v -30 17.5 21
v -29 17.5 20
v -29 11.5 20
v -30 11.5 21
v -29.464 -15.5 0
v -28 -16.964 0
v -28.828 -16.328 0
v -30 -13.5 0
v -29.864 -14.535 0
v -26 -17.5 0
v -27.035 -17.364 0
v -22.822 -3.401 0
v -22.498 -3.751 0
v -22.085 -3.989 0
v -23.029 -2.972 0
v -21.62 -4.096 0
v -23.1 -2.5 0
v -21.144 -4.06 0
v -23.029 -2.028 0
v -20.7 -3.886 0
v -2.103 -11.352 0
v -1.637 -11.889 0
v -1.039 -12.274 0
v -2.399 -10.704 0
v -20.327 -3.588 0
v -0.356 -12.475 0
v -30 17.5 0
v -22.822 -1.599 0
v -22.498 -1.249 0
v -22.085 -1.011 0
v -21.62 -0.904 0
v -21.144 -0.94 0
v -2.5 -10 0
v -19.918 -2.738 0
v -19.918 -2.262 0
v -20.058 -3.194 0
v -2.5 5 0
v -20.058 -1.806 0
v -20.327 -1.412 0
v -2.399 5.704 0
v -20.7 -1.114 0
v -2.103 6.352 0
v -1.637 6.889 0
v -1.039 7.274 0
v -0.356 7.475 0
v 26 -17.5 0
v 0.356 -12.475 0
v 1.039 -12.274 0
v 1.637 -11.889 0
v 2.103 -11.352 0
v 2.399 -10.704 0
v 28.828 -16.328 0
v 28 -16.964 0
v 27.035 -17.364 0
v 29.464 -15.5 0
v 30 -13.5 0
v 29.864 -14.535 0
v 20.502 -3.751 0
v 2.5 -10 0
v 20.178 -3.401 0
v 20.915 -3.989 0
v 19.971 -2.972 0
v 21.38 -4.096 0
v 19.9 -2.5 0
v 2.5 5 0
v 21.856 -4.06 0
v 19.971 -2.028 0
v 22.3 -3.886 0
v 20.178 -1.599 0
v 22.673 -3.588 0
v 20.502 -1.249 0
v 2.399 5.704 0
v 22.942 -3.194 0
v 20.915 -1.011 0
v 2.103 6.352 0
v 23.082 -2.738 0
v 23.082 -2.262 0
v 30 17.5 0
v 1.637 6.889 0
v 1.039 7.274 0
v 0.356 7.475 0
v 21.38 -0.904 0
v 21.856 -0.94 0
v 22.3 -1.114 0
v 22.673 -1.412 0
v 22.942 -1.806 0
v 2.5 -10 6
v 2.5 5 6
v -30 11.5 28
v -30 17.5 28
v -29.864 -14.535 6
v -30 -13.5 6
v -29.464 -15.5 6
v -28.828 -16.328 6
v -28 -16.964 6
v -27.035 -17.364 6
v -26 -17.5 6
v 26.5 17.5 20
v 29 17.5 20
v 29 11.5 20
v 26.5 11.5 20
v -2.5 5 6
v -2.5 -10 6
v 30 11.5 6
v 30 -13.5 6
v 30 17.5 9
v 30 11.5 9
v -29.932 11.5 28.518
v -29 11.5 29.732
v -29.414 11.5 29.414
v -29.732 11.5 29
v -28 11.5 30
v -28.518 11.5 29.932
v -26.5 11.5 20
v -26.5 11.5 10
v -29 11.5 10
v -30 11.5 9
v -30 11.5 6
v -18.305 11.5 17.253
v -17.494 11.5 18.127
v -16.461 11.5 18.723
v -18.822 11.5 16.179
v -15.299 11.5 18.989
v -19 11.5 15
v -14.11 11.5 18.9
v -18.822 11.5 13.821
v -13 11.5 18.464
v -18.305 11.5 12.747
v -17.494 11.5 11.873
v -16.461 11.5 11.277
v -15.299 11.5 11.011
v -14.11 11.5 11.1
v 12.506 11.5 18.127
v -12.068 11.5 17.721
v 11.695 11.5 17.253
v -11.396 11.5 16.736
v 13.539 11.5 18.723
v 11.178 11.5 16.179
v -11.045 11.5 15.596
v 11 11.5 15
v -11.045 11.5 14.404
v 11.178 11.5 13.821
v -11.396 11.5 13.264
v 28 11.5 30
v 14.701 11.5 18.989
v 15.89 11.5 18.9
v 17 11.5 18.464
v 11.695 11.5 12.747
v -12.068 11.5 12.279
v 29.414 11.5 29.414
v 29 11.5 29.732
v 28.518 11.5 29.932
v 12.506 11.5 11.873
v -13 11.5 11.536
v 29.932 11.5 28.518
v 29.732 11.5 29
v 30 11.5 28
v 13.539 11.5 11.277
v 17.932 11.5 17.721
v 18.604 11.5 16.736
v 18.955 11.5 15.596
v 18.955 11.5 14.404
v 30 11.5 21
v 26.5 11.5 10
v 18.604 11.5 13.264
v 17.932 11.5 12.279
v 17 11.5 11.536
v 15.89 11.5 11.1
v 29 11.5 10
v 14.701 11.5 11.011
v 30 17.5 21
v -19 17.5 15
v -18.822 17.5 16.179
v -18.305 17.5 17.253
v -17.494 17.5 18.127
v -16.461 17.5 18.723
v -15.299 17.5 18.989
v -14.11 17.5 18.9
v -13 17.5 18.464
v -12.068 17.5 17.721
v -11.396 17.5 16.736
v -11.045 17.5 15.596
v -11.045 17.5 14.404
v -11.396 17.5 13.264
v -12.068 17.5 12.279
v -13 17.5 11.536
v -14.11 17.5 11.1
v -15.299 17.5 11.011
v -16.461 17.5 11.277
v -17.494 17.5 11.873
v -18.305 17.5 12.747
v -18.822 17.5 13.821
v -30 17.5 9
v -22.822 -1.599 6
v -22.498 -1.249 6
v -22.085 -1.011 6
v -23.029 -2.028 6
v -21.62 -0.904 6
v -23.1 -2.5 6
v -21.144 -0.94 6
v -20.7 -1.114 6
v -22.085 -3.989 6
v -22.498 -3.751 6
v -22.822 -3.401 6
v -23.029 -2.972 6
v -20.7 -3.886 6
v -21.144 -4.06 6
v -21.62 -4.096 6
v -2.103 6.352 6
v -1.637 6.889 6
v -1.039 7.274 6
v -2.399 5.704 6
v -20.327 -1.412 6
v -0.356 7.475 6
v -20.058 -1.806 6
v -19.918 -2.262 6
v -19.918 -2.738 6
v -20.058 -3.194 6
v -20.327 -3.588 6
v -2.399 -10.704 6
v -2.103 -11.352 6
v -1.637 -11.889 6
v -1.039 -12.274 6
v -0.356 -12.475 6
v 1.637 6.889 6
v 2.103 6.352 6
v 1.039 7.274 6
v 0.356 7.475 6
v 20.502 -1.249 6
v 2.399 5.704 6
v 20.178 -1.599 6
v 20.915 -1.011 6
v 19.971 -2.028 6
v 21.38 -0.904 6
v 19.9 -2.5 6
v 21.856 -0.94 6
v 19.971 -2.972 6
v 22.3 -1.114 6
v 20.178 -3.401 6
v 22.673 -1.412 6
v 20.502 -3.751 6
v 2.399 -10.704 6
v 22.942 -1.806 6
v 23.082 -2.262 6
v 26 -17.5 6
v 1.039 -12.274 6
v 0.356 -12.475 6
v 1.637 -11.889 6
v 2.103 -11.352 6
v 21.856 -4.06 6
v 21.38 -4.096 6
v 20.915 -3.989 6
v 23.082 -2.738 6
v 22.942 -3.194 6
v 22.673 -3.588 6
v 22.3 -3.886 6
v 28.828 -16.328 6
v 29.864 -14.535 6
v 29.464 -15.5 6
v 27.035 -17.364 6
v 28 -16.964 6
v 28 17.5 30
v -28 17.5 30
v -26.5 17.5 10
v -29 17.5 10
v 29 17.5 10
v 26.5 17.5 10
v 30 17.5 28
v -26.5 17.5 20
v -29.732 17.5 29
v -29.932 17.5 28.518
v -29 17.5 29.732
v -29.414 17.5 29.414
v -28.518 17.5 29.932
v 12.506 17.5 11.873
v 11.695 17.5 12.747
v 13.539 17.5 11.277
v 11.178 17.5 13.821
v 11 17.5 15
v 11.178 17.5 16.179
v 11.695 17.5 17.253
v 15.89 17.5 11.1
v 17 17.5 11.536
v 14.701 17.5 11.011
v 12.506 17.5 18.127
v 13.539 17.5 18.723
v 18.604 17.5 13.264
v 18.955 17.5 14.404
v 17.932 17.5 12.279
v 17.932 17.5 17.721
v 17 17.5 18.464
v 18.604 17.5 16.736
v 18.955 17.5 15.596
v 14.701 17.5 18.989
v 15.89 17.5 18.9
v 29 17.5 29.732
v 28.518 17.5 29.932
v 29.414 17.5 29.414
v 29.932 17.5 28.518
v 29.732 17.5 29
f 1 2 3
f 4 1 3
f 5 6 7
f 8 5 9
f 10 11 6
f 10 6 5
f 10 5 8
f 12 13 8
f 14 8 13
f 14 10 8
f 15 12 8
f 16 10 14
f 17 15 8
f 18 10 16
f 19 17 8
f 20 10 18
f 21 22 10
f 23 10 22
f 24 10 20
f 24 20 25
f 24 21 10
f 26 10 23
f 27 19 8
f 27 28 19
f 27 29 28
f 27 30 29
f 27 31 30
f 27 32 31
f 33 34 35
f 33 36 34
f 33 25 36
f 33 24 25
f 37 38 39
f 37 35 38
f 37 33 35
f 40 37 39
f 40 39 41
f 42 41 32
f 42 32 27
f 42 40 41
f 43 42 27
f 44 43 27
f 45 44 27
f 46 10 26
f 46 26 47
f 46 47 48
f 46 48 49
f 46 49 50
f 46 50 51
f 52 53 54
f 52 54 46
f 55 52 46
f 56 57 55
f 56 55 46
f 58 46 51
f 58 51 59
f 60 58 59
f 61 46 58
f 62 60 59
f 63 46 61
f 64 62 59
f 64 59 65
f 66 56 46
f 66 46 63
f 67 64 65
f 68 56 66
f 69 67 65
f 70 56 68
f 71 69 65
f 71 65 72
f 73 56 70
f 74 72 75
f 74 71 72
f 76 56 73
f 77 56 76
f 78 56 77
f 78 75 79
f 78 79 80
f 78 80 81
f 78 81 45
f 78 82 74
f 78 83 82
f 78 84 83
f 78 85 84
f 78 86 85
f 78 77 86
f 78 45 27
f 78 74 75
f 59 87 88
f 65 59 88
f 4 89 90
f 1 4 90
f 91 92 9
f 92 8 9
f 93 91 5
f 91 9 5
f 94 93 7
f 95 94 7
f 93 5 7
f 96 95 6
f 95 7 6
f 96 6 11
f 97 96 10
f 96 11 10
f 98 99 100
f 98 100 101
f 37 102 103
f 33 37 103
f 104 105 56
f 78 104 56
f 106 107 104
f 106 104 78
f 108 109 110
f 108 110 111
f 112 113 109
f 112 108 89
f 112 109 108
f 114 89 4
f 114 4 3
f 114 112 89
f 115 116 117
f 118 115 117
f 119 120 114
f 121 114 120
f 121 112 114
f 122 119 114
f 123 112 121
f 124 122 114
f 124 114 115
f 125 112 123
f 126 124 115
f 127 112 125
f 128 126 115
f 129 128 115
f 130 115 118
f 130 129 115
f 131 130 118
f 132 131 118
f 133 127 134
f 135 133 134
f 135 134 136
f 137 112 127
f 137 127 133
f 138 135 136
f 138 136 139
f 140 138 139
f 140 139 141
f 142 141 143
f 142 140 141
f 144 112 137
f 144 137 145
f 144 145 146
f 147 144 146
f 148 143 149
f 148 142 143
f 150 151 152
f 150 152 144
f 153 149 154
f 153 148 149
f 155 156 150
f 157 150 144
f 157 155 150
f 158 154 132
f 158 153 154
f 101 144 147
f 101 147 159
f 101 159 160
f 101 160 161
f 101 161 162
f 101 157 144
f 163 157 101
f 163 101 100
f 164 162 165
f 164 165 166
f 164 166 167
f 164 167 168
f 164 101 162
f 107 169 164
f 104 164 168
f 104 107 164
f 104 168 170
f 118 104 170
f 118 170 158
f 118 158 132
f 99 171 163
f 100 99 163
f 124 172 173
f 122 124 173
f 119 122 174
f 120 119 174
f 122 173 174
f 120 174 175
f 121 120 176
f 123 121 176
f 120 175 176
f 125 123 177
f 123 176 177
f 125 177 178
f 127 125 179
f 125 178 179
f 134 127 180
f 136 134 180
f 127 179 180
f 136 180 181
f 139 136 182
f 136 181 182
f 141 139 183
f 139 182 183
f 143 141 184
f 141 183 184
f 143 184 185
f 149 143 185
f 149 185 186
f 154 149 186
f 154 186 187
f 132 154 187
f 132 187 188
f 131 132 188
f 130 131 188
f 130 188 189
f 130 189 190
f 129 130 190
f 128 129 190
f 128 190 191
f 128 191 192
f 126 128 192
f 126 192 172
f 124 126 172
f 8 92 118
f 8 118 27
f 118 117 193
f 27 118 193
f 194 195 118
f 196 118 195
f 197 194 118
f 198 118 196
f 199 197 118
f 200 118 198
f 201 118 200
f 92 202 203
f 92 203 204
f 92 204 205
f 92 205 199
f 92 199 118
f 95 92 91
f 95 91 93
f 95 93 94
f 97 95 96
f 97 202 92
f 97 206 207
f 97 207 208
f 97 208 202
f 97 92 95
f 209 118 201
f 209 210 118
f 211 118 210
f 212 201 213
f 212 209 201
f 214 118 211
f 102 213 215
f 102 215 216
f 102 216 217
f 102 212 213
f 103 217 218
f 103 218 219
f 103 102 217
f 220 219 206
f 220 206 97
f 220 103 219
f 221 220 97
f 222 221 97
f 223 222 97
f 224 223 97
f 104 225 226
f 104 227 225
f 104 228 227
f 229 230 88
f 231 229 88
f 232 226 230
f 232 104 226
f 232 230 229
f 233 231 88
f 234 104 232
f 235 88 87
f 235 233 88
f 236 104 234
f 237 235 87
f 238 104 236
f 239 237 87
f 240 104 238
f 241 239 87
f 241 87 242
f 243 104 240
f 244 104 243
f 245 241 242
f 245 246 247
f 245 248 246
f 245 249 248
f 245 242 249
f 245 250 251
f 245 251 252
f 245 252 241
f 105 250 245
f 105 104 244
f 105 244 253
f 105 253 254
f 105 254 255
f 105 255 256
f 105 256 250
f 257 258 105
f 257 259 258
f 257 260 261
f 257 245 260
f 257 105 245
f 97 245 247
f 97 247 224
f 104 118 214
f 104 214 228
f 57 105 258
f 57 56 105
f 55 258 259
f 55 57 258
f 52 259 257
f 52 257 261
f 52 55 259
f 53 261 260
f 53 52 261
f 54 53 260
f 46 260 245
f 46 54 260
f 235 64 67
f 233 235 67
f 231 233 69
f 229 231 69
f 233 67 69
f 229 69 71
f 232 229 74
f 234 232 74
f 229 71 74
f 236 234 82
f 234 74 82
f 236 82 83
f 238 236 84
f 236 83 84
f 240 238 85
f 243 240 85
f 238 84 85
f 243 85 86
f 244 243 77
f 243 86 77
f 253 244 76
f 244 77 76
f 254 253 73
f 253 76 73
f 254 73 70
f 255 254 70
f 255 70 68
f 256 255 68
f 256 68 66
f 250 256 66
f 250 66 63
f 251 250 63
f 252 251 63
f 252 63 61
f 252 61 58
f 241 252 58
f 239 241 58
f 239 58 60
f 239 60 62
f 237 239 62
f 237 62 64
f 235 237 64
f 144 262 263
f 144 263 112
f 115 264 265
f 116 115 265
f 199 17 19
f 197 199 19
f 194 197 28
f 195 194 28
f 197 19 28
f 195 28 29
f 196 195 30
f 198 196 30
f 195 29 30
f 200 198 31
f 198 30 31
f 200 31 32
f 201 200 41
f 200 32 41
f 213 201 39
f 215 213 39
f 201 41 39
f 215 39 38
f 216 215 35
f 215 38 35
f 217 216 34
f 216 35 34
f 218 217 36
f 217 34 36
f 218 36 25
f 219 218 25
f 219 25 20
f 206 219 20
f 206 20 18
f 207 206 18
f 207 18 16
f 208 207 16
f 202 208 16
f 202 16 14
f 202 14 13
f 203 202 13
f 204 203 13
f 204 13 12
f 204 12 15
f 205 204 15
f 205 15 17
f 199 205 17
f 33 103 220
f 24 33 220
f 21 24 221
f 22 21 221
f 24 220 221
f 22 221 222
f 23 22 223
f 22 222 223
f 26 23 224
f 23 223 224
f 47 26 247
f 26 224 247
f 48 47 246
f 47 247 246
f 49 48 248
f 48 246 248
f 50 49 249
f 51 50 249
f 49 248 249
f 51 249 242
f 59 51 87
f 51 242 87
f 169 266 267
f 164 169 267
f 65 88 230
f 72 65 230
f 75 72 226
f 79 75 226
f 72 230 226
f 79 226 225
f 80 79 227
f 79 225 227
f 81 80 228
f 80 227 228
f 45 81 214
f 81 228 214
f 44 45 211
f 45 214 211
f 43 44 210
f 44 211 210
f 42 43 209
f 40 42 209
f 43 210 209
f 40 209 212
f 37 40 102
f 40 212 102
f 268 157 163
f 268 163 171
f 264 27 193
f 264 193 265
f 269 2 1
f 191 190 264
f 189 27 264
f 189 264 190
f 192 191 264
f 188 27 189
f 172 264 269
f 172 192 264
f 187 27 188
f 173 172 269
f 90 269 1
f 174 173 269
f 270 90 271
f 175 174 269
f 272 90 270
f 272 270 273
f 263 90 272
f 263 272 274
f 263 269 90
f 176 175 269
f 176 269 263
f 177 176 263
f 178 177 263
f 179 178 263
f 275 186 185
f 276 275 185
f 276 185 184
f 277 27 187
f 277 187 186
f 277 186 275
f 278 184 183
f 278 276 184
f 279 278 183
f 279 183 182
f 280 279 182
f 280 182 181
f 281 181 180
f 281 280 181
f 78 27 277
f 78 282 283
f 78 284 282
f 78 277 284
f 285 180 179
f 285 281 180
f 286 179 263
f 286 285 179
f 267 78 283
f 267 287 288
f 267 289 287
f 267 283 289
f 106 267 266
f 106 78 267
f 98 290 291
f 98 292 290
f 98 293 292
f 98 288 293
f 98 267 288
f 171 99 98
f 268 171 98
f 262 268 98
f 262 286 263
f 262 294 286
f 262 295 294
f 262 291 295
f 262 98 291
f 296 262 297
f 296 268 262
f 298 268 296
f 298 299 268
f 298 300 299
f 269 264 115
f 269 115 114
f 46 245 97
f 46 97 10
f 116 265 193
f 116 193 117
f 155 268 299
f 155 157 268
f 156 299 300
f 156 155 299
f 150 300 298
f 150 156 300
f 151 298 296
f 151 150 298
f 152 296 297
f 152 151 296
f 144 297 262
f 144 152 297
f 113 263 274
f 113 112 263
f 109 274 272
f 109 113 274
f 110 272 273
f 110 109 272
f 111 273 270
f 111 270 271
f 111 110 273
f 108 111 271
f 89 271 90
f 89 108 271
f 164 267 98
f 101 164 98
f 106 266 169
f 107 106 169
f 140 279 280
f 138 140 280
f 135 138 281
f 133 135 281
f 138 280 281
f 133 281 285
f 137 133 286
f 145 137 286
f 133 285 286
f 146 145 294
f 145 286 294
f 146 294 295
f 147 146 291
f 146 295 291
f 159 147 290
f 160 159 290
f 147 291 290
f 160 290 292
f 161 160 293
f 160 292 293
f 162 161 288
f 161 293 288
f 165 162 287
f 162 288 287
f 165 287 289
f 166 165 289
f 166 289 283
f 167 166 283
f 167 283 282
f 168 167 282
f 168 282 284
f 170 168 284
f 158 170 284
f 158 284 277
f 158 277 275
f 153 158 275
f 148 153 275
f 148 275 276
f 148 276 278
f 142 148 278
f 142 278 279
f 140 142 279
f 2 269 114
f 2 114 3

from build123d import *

# Parameters (mm, degrees)
F1_DEPTH  = 30
F3_D      = 3.2
F4_R      = 4
F4_W      = 3.5
F4_H      = 10
F5_DEPTH  = 35.001
F6_SIZE   = 1
F7_R      = 2
F8_R      = 4
F10_DEPTH = 6.001


with BuildPart() as f1:
    # F0 (on Right) → F1 (new body, symmetric)
    with BuildSketch(Plane.YZ):
        Polygon((-17.5, 0), (17.5, 0), (17.5, 30), (11.5, 30), (11.5, 6), (-17.5, 6), align=None)
    extrude(amount=F1_DEPTH, both=True)

    # F3 (through all)
    with Locations(Plane.XY.offset(6)):
        with Locations((-21.5, -2.5), (21.5, -2.5)):
            Hole(F3_D / 2)

    # F4 (on face) → F5 (cut, through all)
    with BuildSketch(Plane(origin=(0, 17.5, 0), x_dir=(-1, 0, 0), z_dir=(0, 1, 0))):
        with Locations((-15, 15)):
            Circle(F4_R)
        with Locations((15, 15)):
            Circle(F4_R)
        with Locations((28.25, 15)):
            Rectangle(F4_W, F4_H)
        with Locations((-28.25, 15)):
            Rectangle(F4_W, F4_H)
    extrude(amount=-F5_DEPTH, mode=Mode.SUBTRACT)

    # F6
    f6_edges = [f1.edges().sort_by_distance(p)[0] for p in [
        (-30, 14.5, 20),
        (-30, 14.5, 10),
        (30, 14.5, 20),
        (30, 14.5, 10),
    ]]
    chamfer(f6_edges, length=F6_SIZE)

    # F7
    f7_edges = [f1.edges().sort_by_distance(p)[0] for p in [
        (-30, 14.5, 30),
        (30, 14.5, 30),
    ]]
    fillet(f7_edges, radius=F7_R)

    # F8
    f8_edges = [f1.edges().sort_by_distance(p)[0] for p in [
        (-30, -17.5, 3),
        (30, -17.5, 3),
    ]]
    fillet(f8_edges, radius=F8_R)

    # F9 (on face) → F10 (cut, through all)
    with BuildSketch(Plane.XY.offset(6)):
        with BuildLine():
            ThreePointArc((2.5, 5), (0, 7.5), (-2.5, 5))
            Line((-2.5, 5), (-2.5, -10))
            ThreePointArc((-2.5, -10), (0, -12.5), (2.5, -10))
            Line((2.5, -10), (2.5, 5))
        make_face()
    extrude(amount=-F10_DEPTH, mode=Mode.SUBTRACT)


solid = f1.part
